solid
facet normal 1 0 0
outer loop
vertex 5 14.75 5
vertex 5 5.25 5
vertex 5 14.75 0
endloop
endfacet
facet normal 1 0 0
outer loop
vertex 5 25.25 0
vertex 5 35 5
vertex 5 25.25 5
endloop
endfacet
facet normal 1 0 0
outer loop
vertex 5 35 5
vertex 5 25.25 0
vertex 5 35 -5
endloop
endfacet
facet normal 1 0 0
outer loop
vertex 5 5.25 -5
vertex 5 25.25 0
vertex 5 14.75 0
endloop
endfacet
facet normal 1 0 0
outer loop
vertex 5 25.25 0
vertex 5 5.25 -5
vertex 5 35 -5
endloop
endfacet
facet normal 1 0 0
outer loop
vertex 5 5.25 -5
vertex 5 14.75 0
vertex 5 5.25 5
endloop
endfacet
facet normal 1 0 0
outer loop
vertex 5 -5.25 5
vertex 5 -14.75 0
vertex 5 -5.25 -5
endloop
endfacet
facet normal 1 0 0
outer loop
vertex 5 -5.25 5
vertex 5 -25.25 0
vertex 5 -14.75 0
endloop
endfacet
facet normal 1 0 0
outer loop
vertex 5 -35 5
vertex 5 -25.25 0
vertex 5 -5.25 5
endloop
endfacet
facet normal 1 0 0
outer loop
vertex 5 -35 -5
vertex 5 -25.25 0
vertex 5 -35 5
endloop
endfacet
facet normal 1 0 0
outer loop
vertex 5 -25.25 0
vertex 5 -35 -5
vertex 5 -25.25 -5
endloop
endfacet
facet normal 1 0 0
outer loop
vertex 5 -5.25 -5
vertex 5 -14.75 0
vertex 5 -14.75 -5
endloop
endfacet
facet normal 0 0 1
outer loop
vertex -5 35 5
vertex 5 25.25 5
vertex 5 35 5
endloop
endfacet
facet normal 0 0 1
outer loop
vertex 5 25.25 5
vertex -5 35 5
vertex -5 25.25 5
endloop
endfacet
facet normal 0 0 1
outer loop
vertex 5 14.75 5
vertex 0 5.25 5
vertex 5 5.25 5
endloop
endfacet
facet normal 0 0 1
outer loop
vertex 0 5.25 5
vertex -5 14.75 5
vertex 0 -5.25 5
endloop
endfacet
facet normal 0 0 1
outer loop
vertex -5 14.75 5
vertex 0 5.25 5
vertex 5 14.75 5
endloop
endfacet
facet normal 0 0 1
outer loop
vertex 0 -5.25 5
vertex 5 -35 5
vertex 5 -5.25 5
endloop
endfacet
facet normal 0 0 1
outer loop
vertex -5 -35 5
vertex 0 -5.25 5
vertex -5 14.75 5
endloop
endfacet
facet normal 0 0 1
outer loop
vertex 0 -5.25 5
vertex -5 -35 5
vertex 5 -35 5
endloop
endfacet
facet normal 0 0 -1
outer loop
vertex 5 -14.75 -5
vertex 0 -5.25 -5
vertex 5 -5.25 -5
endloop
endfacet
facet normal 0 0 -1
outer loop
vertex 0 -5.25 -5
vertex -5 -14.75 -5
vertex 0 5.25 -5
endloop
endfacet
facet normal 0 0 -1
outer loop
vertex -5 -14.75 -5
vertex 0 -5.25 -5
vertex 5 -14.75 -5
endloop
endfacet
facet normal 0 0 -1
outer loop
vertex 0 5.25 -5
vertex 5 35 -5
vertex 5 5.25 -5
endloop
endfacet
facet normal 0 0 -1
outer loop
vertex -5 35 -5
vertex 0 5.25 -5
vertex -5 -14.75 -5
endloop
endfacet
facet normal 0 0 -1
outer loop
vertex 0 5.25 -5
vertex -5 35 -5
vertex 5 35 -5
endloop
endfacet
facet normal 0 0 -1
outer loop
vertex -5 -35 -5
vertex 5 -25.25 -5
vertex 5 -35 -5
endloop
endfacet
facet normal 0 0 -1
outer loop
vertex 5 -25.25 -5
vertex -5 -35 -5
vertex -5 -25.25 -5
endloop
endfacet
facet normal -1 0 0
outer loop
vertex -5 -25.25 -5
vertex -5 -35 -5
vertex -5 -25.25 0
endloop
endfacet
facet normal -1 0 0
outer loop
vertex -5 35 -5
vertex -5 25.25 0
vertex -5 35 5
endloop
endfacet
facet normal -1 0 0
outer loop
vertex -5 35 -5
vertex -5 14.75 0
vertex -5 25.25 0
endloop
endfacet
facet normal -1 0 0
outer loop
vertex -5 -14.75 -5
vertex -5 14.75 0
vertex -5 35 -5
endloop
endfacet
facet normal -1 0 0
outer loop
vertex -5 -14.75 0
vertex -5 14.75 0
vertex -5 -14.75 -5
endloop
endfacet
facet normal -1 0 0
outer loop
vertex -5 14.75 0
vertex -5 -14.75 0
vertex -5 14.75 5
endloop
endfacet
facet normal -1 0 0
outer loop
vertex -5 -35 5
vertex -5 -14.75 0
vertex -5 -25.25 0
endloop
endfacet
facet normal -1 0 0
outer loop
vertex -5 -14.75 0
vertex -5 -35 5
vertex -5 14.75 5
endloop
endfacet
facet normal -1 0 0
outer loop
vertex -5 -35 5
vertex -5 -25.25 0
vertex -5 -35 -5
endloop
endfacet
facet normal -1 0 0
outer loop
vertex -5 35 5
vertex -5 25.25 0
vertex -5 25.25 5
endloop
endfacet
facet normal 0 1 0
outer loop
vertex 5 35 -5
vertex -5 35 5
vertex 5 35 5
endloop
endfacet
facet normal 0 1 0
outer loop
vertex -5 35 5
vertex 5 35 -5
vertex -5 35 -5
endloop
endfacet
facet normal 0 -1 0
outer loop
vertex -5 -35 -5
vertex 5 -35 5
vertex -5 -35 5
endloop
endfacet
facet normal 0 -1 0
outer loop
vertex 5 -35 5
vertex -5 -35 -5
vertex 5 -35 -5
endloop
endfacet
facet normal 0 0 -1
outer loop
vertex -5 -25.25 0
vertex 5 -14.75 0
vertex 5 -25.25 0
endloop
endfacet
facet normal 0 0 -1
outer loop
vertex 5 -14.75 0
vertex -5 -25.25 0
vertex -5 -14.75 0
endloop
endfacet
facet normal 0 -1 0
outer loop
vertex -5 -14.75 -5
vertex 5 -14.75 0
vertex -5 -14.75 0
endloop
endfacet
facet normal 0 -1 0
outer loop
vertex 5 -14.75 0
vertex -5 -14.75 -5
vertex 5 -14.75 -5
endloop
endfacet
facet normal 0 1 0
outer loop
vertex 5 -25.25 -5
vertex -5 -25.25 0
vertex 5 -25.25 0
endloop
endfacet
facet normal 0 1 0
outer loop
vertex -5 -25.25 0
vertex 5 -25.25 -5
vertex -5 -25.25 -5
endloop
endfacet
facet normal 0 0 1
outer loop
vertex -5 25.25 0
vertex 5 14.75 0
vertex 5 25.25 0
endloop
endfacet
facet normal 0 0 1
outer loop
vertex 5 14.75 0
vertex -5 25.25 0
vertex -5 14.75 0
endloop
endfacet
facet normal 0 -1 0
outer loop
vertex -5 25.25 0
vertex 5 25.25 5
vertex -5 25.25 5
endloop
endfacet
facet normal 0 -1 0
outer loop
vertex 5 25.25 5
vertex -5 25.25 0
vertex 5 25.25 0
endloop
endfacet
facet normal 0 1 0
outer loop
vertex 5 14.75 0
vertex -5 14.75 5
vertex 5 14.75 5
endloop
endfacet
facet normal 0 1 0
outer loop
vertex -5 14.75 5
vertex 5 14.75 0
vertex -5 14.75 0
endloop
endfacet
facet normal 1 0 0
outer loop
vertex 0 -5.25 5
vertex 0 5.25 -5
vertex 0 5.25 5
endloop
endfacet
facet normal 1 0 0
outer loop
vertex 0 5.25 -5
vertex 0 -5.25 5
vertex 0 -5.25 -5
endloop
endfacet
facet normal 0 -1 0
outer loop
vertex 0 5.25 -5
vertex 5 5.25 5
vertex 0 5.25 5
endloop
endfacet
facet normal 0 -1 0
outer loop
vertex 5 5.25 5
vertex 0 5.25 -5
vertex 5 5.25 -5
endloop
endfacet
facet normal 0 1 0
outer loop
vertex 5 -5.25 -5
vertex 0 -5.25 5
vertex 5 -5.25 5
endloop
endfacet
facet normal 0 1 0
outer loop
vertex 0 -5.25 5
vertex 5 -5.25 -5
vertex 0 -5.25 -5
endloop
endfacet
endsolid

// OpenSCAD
$fn=50;
s=10;
g=0.5;

module base(r=0)
{
    difference()
    {
        cube([s-r*2,s*7-r*2,s-r*2],center=true);
     
        translate([0,-s*2,-(s+g)/2])
        cube(s+g+r*2,center=true);
        
        translate([0,s*2,(s+g)/2])
        cube(s+g+r*2,center=true);
    }
}

module A(i=-1,r=0)
{
    minkowski()
    {
        difference()
        {
            base(r);
            
            translate([(s+g)/2*i,0,0])
            cube(s+g+r*2,center=true);
        }
        sphere(r);
    }
}

A(1);
//A(1, 1); // print * 10
//A(-1, 1); // print * 2
